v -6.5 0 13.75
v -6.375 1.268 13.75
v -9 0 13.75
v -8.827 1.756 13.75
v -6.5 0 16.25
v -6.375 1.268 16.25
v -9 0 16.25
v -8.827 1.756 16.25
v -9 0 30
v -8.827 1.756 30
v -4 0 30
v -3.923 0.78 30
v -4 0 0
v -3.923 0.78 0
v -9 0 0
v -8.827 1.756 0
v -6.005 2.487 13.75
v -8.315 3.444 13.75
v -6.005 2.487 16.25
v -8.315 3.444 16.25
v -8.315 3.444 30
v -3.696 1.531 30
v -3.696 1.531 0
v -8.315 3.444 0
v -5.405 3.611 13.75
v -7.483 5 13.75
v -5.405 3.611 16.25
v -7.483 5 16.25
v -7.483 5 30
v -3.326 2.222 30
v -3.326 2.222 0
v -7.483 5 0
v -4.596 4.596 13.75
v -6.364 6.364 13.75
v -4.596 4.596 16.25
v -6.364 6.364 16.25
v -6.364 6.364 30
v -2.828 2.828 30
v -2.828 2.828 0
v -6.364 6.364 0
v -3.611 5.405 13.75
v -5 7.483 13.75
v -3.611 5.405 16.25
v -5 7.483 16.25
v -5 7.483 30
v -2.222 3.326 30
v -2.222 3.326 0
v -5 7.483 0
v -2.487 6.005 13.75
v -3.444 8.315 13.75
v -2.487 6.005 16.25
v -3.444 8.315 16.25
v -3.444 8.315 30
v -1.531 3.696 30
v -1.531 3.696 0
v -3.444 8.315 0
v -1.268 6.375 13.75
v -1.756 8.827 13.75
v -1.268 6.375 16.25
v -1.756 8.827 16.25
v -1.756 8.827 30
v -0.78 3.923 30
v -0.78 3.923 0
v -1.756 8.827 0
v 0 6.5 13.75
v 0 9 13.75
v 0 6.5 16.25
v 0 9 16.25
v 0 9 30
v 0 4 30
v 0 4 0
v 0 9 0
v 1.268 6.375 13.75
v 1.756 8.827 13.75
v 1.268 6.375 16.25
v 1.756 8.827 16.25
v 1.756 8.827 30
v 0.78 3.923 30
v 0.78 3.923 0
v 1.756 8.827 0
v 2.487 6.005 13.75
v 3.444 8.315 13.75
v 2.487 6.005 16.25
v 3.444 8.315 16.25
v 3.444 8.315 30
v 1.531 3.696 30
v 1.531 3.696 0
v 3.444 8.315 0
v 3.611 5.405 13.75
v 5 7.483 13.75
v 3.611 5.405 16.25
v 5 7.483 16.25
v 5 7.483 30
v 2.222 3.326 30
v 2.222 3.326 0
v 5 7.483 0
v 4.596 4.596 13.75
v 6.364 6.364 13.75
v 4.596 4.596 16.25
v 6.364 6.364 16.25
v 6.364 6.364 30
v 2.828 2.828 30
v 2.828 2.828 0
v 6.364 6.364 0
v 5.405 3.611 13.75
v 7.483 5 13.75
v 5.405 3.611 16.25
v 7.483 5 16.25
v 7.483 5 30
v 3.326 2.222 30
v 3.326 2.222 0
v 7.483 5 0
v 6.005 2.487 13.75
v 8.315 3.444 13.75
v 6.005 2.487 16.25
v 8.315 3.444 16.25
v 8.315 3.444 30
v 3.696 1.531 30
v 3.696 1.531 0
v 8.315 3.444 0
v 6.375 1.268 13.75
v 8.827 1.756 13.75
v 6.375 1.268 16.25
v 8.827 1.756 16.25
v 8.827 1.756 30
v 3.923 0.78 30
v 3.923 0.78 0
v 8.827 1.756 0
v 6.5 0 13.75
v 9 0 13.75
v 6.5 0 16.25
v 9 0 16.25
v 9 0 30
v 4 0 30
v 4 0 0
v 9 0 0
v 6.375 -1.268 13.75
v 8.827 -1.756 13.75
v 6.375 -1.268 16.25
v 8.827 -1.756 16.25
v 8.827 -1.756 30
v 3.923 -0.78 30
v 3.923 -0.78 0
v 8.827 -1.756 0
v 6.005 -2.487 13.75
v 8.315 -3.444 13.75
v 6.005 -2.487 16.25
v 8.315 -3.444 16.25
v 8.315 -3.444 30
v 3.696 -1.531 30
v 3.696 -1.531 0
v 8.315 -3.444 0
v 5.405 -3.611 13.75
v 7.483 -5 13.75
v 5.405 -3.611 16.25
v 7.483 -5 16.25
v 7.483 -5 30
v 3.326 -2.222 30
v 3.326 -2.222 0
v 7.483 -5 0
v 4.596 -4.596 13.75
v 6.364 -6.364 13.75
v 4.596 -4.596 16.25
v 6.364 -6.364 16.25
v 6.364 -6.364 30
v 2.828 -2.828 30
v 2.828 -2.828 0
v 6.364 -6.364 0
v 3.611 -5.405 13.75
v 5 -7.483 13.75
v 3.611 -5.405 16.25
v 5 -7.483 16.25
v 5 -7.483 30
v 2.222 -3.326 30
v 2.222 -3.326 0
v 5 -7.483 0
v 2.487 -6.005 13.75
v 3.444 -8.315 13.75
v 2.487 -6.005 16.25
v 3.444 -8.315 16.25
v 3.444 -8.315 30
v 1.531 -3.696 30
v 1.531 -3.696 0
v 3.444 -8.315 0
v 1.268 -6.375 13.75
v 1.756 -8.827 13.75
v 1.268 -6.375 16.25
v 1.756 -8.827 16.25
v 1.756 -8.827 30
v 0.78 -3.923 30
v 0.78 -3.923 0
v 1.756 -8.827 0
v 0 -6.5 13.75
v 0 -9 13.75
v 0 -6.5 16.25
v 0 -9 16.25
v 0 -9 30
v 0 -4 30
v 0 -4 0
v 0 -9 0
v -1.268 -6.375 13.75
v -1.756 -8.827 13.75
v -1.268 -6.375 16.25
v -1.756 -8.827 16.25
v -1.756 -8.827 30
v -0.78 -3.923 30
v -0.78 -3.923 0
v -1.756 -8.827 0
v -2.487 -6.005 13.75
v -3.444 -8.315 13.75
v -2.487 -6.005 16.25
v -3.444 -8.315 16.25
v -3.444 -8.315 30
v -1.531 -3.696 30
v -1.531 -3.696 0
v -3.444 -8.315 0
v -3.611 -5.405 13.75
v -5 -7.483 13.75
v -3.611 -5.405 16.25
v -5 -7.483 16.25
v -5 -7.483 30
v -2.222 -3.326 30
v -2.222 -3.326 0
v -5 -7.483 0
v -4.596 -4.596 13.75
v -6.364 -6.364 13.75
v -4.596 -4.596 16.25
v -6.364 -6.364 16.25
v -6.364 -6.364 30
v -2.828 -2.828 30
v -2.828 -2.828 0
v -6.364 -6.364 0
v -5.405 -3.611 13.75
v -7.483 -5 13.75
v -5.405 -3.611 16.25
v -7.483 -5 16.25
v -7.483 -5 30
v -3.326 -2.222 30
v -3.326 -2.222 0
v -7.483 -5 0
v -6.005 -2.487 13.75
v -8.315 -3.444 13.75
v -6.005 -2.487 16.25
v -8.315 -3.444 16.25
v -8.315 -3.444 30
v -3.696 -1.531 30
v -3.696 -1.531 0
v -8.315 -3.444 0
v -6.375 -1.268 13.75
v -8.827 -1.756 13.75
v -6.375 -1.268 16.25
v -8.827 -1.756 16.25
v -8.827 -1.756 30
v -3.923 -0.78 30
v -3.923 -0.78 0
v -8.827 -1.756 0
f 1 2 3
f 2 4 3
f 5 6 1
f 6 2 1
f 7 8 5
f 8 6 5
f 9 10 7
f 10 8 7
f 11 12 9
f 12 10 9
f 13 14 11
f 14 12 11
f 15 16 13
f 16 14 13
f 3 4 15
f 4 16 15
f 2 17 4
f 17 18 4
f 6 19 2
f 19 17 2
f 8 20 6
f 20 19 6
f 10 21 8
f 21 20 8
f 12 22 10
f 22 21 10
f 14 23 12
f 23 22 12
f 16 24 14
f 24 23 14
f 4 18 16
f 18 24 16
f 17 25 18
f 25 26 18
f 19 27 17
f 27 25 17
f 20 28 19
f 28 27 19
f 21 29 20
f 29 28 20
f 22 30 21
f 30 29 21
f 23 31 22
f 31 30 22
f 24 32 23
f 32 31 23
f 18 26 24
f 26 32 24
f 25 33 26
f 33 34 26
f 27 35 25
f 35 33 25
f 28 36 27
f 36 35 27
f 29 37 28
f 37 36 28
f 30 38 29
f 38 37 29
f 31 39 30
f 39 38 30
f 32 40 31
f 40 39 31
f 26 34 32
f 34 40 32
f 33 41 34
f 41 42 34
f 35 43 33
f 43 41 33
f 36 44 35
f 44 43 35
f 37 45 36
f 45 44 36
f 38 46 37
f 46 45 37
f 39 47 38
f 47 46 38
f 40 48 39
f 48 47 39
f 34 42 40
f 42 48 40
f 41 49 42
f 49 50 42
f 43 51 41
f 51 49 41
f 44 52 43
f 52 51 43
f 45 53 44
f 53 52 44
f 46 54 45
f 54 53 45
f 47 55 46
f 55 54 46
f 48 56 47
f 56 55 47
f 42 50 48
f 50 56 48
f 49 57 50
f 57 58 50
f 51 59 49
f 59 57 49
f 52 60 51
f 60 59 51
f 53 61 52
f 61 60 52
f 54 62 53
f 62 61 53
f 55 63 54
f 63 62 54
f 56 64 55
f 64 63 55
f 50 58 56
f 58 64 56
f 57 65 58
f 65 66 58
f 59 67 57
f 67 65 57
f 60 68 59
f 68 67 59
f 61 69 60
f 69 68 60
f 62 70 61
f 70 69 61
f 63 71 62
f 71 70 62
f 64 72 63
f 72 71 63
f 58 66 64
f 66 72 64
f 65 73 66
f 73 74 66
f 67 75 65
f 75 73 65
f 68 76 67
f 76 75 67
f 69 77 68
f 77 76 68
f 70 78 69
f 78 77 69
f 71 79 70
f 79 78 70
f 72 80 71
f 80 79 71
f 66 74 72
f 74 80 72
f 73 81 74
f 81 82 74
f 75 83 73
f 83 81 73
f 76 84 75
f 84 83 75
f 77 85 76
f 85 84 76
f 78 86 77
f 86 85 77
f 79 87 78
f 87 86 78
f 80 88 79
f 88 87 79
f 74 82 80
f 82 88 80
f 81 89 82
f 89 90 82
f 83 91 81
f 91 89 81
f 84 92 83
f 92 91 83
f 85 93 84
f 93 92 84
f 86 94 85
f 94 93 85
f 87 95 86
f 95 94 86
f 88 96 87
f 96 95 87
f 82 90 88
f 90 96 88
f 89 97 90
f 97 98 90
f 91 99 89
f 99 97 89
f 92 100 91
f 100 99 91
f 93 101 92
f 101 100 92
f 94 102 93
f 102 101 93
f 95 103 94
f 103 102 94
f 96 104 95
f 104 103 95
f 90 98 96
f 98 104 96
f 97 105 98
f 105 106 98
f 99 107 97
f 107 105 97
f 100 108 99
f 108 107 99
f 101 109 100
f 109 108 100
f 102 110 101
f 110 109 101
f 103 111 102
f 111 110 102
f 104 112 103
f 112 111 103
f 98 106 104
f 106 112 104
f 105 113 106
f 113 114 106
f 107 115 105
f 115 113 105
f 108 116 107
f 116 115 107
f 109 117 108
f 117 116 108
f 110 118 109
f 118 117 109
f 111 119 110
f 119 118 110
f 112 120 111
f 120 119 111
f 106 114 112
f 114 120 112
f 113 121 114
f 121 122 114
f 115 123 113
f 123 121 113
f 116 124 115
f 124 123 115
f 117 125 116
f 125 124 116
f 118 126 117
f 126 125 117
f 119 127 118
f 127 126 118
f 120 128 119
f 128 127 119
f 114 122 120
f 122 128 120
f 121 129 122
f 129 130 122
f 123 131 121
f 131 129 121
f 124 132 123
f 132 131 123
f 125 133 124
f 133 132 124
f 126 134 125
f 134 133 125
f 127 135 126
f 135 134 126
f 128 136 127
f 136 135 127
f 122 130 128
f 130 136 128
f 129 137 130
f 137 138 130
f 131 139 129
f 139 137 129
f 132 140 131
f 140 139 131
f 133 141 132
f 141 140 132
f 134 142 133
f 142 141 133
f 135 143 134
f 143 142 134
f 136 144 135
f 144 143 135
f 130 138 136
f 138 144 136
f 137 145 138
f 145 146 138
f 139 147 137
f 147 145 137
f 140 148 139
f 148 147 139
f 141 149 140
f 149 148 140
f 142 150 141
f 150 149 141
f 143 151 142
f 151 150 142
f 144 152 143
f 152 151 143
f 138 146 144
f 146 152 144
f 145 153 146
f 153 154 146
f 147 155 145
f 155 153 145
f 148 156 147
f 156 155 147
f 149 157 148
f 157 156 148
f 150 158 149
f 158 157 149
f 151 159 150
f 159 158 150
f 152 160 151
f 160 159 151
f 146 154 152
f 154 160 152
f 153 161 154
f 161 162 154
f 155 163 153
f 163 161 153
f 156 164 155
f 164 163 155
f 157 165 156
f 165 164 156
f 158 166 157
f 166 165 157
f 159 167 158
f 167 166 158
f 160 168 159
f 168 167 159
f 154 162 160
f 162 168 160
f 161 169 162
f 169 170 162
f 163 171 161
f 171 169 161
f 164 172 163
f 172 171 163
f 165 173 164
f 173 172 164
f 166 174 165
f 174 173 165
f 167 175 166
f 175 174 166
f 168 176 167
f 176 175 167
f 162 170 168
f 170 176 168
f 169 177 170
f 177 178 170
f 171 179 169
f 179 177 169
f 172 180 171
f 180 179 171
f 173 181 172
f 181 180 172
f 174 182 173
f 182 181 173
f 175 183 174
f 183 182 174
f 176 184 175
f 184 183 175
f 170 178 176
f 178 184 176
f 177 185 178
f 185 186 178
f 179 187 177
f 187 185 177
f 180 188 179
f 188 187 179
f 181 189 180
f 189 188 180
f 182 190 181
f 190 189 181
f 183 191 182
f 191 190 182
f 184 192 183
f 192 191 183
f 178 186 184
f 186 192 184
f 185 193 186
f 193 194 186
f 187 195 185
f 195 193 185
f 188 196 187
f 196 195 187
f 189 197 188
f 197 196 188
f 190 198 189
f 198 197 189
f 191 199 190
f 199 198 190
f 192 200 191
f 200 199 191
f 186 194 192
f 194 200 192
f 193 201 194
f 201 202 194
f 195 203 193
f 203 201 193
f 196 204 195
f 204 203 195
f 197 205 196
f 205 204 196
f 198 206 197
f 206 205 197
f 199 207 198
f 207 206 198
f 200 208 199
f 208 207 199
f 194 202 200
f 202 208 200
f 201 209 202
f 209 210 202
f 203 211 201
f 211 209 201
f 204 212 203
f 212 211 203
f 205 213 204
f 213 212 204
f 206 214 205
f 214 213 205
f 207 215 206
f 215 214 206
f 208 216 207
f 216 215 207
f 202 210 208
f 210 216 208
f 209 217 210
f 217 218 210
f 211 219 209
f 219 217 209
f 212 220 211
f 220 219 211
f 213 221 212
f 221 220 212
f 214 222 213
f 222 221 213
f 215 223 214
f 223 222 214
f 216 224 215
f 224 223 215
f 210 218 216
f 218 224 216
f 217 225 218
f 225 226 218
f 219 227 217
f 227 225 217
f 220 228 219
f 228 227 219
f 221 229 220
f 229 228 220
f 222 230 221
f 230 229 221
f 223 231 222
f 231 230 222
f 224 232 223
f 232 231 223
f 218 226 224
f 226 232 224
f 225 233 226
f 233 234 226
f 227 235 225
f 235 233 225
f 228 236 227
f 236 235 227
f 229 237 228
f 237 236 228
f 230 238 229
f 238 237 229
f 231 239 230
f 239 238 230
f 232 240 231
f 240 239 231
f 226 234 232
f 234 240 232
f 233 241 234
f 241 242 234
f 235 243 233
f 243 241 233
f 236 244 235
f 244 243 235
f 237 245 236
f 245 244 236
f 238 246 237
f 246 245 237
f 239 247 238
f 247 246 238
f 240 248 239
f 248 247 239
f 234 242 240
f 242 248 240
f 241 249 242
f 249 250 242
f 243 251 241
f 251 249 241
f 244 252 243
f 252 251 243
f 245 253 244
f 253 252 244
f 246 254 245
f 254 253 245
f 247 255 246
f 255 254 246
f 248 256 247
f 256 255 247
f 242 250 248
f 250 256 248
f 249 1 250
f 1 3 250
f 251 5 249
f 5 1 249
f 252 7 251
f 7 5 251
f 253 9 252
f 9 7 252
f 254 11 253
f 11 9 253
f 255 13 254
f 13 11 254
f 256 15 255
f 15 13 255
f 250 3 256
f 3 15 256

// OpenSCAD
$fn = 32;

// ----------------------------------------------------------------------
// Grooved revolve: plain_grooves, bore R4
// ----------------------------------------------------------------------

// --- parameters (mm) ---
bore_r = 4;               // bore radius
outer_r = 9;              // outer radius of the body
total_h = 30;             // overall height, Z
wall = 5;                 // radial wall thickness
groove_w = 2.5;           // groove width
groove_d = 2.5;           // groove depth
grooves = 1;              // number of outer grooves
fit_tol = 0.05;           // declared fit tolerance (prompt contract)
free_tol = 0.2;           // declared free tolerance (prompt contract)

bbox_x = 2 * outer_r;  // full diameter
bore_d = 2 * bore_r;  // bore diameter
body_d = 2 * outer_r;  // body diameter
revolve_angle = 360;  // full turn around the Z axis

profile = [[4, 0], [9, 0], [9, 13.75], [6.5, 13.75], [6.5, 16.25], [9, 16.25], [9, 30], [4, 30]];  // primary outline, 8 points, counter clockwise

// --- the one profile operation ---
rotate_extrude(angle = revolve_angle) polygon(points = profile);
